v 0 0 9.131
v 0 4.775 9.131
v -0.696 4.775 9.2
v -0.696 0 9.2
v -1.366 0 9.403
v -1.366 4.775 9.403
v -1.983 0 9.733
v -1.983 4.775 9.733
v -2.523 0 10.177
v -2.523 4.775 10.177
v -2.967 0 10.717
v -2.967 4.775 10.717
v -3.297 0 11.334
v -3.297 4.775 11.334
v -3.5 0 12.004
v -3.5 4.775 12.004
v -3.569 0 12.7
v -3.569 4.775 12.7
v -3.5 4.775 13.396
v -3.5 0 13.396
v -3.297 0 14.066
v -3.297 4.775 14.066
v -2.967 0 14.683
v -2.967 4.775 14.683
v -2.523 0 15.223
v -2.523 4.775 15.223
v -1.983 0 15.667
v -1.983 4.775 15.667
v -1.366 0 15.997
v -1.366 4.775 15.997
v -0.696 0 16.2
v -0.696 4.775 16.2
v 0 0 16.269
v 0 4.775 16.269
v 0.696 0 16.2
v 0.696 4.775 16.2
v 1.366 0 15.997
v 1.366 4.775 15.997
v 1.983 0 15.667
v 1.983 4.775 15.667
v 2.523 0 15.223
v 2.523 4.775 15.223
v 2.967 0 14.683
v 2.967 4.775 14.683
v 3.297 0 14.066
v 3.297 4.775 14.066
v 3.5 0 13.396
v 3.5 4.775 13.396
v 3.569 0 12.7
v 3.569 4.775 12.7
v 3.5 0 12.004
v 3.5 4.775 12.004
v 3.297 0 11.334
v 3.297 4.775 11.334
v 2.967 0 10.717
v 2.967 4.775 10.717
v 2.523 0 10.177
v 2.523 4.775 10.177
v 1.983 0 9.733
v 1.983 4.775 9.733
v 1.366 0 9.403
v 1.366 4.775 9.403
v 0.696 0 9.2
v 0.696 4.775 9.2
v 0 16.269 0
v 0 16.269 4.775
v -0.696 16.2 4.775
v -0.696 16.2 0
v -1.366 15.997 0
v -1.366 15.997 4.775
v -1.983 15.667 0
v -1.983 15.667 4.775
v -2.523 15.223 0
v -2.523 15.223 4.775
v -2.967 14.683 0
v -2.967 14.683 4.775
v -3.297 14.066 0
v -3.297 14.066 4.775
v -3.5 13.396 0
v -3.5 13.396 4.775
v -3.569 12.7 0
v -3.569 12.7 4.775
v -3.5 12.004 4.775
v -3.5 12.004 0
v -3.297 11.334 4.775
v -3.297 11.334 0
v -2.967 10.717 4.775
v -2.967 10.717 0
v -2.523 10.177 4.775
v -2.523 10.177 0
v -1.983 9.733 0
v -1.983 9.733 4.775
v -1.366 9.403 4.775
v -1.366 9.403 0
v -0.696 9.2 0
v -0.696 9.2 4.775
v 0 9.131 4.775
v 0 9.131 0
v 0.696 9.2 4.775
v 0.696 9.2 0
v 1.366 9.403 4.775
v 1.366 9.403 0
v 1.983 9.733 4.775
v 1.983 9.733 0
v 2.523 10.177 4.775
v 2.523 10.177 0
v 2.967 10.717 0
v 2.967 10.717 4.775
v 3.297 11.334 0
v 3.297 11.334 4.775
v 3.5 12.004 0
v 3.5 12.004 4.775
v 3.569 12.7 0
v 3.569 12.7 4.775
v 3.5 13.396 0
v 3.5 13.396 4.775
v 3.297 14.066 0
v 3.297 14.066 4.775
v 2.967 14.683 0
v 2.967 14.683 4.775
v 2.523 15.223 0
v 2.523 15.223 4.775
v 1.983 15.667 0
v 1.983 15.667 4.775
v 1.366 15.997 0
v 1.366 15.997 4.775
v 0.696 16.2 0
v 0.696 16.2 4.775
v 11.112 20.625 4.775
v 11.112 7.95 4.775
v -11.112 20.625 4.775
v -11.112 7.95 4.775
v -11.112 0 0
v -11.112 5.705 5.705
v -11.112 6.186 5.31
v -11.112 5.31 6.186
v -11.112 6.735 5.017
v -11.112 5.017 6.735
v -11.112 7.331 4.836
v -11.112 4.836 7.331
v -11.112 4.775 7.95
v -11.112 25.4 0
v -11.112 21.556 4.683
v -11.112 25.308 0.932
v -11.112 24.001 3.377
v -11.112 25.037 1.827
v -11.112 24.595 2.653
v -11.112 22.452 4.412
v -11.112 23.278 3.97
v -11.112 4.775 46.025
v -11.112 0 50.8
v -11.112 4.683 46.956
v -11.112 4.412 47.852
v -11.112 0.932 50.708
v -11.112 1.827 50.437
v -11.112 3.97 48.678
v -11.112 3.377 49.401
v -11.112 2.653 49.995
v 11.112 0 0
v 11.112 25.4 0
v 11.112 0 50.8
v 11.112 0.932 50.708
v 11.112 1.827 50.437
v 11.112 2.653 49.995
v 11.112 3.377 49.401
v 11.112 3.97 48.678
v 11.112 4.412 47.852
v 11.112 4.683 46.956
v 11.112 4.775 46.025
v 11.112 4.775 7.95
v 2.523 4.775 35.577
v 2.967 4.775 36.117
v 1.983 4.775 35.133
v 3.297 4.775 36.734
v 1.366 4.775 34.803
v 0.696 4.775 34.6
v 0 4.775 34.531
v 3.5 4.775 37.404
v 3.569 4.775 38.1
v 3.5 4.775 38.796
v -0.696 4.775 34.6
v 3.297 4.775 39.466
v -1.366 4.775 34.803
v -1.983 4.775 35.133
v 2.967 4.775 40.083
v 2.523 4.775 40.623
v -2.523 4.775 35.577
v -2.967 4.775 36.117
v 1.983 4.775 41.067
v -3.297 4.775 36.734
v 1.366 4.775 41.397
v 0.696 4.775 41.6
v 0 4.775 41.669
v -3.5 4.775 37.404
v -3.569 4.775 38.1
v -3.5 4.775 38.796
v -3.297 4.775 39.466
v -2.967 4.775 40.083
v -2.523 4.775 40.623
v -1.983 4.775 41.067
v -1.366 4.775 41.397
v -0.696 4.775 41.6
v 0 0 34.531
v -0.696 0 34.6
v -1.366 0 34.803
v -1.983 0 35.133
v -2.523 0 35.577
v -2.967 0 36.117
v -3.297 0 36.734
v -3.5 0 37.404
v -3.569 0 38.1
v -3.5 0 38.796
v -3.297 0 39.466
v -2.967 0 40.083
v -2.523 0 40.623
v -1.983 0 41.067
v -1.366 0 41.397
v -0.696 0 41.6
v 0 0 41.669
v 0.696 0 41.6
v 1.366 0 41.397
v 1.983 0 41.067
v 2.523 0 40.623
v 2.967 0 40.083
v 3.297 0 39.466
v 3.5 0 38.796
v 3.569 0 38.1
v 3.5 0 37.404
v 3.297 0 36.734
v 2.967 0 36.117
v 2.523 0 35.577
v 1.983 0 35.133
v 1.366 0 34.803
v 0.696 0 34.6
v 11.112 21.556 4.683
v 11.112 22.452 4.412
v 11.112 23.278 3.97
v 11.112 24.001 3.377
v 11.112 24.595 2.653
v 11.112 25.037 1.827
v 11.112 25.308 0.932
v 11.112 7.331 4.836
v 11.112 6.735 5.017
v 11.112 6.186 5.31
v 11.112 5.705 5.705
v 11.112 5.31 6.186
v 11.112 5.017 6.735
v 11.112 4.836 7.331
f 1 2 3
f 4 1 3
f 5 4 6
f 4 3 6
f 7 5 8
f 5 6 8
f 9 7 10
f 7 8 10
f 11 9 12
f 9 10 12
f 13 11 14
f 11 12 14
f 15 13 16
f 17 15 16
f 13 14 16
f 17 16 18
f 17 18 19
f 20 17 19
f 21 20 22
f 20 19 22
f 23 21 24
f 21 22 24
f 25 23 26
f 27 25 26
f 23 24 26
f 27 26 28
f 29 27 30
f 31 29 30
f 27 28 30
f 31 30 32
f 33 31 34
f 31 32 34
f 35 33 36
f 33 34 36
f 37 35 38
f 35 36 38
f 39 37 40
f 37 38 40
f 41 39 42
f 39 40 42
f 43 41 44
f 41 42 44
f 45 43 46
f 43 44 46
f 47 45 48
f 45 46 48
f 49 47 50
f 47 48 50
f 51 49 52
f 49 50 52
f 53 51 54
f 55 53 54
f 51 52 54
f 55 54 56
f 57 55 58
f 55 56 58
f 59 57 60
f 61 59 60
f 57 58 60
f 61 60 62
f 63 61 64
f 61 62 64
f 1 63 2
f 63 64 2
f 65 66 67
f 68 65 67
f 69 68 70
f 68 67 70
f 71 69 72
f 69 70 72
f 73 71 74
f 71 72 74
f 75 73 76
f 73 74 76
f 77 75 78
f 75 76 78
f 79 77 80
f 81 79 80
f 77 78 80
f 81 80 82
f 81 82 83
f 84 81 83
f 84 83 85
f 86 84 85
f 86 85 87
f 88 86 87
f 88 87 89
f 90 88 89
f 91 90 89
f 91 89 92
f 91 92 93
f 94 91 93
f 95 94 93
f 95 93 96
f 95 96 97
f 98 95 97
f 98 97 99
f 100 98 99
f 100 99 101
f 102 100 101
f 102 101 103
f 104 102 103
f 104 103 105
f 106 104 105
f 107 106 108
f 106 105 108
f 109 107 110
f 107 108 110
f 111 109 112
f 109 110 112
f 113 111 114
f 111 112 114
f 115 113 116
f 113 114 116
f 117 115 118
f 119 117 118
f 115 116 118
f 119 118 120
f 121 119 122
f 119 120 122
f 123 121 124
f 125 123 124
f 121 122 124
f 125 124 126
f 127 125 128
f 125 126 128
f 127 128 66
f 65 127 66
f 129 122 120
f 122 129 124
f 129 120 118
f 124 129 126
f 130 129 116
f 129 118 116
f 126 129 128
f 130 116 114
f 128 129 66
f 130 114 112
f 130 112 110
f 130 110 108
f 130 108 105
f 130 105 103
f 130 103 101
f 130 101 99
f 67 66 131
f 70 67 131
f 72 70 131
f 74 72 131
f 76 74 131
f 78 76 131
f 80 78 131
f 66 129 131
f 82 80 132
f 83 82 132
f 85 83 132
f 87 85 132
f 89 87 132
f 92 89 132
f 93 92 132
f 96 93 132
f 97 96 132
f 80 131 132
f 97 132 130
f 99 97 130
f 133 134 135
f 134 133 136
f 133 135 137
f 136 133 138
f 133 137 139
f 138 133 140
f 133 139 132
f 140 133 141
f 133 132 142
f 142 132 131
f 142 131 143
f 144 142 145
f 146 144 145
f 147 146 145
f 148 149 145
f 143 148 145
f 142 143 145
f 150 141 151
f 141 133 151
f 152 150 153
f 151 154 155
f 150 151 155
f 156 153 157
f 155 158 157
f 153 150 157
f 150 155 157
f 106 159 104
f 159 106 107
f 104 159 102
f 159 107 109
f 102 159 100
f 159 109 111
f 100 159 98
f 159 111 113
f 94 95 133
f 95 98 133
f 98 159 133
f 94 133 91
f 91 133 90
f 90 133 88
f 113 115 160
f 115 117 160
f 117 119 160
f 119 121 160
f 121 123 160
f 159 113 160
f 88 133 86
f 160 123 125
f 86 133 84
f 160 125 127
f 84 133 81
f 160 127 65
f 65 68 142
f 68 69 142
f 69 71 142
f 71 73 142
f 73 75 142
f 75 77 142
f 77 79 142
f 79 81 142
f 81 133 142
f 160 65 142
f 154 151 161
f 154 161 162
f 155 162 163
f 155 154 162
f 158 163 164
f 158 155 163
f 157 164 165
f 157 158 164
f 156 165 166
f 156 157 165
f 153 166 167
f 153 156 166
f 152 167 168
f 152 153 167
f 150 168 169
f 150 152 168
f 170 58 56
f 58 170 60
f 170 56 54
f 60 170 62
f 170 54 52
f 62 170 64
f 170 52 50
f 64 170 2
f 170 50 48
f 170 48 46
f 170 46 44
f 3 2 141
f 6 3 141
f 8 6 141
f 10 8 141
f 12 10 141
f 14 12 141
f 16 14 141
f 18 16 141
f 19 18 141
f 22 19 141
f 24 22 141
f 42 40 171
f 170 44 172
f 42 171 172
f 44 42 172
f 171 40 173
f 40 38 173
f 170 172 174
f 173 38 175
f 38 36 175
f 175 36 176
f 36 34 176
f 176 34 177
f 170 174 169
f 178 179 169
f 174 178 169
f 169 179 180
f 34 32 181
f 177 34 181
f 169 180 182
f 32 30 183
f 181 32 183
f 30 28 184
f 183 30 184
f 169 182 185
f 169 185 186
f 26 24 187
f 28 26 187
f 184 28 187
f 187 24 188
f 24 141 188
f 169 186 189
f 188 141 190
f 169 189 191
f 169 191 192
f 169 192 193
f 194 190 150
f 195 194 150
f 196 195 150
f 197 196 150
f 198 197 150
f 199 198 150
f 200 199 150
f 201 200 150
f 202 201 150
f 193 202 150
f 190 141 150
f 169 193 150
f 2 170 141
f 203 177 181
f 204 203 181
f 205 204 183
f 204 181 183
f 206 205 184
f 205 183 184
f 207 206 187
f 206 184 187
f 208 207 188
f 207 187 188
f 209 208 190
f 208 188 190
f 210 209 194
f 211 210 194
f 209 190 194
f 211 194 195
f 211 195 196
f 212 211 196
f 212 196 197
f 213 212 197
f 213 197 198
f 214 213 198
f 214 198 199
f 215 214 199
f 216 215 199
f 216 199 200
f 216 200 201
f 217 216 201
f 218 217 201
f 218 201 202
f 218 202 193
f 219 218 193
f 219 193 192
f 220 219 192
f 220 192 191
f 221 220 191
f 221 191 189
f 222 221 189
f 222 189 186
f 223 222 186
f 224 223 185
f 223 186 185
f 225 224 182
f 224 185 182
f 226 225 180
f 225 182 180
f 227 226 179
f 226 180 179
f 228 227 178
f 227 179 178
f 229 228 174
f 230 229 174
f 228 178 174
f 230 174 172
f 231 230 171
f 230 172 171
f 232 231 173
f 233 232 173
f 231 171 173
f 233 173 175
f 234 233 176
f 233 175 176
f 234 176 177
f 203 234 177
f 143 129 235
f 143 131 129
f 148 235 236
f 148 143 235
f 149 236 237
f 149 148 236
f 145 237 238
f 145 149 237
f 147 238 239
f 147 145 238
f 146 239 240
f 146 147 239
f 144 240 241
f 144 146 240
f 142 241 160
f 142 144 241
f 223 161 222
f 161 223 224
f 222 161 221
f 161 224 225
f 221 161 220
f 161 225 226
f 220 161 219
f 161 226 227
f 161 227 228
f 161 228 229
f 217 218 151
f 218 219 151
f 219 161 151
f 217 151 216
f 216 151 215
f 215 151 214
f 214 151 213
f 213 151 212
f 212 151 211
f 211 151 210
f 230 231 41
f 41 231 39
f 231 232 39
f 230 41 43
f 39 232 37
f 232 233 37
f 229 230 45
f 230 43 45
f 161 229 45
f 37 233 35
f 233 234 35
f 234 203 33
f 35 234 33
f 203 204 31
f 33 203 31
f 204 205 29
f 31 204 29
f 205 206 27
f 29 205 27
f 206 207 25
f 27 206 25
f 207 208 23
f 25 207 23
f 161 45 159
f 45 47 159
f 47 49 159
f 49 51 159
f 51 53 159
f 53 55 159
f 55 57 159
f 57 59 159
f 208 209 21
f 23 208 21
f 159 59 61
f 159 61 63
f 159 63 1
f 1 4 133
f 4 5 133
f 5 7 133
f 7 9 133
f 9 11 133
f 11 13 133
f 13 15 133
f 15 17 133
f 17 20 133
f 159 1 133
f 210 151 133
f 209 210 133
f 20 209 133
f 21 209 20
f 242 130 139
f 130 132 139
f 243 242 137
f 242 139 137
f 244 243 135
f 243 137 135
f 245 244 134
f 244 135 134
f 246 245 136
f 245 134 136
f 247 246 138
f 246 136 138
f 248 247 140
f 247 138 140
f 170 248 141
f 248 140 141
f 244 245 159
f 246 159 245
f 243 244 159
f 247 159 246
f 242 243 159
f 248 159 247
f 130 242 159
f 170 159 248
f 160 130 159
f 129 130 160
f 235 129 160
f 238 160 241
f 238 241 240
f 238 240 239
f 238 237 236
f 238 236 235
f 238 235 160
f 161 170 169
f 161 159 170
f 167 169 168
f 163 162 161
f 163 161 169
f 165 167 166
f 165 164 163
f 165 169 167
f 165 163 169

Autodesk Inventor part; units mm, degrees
ref_plane "YZ Plane" through (0, 0, 0) normal (1, 0, 0) x (0, 1, 0)
ref_plane "XZ Plane" through (0, 0, 0) normal (0, 1, 0) x (-1, 0, 0)
ref_plane "XY Plane" through (0, 0, 0) normal (0, 0, 1) x (1, 0, 0)
sketch "Sketch_1" plane through (0, 0, 0) normal (1, 0, 0) x (0, 1, 0)
  line L0 (0, 50.8) -> (0, 0)
  line L1 (0, 0) -> (25.4, 0)
  arc A0 (25.4, 0) -> (20.6248, 4.7752) centre (20.6248, 0) ccw
  line L2 (20.6248, 4.7752) -> (7.9502, 4.7752)
  arc A1 (4.7752, 7.9502) -> (7.9502, 4.7752) centre (7.9502, 7.9502) ccw
  line L3 (4.7752, 7.9502) -> (4.7752, 46.0248)
  arc A2 (4.7752, 46.0248) -> (0, 50.8) centre (0, 46.0248) ccw
extrude "Extrusion1" add sketch "Sketch_1" along normal mid plane 22.225
sketch "Sketch2" plane through (11.1125, 25.4, 0) normal (0, 0, -1) x (-1, 0, 0)
  point P0 (11.1125, -12.7)
hole "Hole1" at (0, 12.7, 0) direction (0, 0, 1) diameter 7.1374 depth 4.7752
sketch "Sketch3" plane through (-11.1125, 0, 0) normal (0, -1, 0) x (1, 0, 0)
  point P0 (11.1125, 12.7)
hole "Hole2" at (0, 0, 12.7) direction (0, 1, 0) diameter 7.1374 depth 4.7752
sketch "Sketch4" plane through (-11.1125, 0, 0) normal (0, -1, 0) x (1, 0, 0)
  point P0 (11.1125, 38.1)
hole "Hole3" at (0, 0, 38.1) direction (0, 1, 0) diameter 7.1374 depth 4.7752
properties part number "4176"
